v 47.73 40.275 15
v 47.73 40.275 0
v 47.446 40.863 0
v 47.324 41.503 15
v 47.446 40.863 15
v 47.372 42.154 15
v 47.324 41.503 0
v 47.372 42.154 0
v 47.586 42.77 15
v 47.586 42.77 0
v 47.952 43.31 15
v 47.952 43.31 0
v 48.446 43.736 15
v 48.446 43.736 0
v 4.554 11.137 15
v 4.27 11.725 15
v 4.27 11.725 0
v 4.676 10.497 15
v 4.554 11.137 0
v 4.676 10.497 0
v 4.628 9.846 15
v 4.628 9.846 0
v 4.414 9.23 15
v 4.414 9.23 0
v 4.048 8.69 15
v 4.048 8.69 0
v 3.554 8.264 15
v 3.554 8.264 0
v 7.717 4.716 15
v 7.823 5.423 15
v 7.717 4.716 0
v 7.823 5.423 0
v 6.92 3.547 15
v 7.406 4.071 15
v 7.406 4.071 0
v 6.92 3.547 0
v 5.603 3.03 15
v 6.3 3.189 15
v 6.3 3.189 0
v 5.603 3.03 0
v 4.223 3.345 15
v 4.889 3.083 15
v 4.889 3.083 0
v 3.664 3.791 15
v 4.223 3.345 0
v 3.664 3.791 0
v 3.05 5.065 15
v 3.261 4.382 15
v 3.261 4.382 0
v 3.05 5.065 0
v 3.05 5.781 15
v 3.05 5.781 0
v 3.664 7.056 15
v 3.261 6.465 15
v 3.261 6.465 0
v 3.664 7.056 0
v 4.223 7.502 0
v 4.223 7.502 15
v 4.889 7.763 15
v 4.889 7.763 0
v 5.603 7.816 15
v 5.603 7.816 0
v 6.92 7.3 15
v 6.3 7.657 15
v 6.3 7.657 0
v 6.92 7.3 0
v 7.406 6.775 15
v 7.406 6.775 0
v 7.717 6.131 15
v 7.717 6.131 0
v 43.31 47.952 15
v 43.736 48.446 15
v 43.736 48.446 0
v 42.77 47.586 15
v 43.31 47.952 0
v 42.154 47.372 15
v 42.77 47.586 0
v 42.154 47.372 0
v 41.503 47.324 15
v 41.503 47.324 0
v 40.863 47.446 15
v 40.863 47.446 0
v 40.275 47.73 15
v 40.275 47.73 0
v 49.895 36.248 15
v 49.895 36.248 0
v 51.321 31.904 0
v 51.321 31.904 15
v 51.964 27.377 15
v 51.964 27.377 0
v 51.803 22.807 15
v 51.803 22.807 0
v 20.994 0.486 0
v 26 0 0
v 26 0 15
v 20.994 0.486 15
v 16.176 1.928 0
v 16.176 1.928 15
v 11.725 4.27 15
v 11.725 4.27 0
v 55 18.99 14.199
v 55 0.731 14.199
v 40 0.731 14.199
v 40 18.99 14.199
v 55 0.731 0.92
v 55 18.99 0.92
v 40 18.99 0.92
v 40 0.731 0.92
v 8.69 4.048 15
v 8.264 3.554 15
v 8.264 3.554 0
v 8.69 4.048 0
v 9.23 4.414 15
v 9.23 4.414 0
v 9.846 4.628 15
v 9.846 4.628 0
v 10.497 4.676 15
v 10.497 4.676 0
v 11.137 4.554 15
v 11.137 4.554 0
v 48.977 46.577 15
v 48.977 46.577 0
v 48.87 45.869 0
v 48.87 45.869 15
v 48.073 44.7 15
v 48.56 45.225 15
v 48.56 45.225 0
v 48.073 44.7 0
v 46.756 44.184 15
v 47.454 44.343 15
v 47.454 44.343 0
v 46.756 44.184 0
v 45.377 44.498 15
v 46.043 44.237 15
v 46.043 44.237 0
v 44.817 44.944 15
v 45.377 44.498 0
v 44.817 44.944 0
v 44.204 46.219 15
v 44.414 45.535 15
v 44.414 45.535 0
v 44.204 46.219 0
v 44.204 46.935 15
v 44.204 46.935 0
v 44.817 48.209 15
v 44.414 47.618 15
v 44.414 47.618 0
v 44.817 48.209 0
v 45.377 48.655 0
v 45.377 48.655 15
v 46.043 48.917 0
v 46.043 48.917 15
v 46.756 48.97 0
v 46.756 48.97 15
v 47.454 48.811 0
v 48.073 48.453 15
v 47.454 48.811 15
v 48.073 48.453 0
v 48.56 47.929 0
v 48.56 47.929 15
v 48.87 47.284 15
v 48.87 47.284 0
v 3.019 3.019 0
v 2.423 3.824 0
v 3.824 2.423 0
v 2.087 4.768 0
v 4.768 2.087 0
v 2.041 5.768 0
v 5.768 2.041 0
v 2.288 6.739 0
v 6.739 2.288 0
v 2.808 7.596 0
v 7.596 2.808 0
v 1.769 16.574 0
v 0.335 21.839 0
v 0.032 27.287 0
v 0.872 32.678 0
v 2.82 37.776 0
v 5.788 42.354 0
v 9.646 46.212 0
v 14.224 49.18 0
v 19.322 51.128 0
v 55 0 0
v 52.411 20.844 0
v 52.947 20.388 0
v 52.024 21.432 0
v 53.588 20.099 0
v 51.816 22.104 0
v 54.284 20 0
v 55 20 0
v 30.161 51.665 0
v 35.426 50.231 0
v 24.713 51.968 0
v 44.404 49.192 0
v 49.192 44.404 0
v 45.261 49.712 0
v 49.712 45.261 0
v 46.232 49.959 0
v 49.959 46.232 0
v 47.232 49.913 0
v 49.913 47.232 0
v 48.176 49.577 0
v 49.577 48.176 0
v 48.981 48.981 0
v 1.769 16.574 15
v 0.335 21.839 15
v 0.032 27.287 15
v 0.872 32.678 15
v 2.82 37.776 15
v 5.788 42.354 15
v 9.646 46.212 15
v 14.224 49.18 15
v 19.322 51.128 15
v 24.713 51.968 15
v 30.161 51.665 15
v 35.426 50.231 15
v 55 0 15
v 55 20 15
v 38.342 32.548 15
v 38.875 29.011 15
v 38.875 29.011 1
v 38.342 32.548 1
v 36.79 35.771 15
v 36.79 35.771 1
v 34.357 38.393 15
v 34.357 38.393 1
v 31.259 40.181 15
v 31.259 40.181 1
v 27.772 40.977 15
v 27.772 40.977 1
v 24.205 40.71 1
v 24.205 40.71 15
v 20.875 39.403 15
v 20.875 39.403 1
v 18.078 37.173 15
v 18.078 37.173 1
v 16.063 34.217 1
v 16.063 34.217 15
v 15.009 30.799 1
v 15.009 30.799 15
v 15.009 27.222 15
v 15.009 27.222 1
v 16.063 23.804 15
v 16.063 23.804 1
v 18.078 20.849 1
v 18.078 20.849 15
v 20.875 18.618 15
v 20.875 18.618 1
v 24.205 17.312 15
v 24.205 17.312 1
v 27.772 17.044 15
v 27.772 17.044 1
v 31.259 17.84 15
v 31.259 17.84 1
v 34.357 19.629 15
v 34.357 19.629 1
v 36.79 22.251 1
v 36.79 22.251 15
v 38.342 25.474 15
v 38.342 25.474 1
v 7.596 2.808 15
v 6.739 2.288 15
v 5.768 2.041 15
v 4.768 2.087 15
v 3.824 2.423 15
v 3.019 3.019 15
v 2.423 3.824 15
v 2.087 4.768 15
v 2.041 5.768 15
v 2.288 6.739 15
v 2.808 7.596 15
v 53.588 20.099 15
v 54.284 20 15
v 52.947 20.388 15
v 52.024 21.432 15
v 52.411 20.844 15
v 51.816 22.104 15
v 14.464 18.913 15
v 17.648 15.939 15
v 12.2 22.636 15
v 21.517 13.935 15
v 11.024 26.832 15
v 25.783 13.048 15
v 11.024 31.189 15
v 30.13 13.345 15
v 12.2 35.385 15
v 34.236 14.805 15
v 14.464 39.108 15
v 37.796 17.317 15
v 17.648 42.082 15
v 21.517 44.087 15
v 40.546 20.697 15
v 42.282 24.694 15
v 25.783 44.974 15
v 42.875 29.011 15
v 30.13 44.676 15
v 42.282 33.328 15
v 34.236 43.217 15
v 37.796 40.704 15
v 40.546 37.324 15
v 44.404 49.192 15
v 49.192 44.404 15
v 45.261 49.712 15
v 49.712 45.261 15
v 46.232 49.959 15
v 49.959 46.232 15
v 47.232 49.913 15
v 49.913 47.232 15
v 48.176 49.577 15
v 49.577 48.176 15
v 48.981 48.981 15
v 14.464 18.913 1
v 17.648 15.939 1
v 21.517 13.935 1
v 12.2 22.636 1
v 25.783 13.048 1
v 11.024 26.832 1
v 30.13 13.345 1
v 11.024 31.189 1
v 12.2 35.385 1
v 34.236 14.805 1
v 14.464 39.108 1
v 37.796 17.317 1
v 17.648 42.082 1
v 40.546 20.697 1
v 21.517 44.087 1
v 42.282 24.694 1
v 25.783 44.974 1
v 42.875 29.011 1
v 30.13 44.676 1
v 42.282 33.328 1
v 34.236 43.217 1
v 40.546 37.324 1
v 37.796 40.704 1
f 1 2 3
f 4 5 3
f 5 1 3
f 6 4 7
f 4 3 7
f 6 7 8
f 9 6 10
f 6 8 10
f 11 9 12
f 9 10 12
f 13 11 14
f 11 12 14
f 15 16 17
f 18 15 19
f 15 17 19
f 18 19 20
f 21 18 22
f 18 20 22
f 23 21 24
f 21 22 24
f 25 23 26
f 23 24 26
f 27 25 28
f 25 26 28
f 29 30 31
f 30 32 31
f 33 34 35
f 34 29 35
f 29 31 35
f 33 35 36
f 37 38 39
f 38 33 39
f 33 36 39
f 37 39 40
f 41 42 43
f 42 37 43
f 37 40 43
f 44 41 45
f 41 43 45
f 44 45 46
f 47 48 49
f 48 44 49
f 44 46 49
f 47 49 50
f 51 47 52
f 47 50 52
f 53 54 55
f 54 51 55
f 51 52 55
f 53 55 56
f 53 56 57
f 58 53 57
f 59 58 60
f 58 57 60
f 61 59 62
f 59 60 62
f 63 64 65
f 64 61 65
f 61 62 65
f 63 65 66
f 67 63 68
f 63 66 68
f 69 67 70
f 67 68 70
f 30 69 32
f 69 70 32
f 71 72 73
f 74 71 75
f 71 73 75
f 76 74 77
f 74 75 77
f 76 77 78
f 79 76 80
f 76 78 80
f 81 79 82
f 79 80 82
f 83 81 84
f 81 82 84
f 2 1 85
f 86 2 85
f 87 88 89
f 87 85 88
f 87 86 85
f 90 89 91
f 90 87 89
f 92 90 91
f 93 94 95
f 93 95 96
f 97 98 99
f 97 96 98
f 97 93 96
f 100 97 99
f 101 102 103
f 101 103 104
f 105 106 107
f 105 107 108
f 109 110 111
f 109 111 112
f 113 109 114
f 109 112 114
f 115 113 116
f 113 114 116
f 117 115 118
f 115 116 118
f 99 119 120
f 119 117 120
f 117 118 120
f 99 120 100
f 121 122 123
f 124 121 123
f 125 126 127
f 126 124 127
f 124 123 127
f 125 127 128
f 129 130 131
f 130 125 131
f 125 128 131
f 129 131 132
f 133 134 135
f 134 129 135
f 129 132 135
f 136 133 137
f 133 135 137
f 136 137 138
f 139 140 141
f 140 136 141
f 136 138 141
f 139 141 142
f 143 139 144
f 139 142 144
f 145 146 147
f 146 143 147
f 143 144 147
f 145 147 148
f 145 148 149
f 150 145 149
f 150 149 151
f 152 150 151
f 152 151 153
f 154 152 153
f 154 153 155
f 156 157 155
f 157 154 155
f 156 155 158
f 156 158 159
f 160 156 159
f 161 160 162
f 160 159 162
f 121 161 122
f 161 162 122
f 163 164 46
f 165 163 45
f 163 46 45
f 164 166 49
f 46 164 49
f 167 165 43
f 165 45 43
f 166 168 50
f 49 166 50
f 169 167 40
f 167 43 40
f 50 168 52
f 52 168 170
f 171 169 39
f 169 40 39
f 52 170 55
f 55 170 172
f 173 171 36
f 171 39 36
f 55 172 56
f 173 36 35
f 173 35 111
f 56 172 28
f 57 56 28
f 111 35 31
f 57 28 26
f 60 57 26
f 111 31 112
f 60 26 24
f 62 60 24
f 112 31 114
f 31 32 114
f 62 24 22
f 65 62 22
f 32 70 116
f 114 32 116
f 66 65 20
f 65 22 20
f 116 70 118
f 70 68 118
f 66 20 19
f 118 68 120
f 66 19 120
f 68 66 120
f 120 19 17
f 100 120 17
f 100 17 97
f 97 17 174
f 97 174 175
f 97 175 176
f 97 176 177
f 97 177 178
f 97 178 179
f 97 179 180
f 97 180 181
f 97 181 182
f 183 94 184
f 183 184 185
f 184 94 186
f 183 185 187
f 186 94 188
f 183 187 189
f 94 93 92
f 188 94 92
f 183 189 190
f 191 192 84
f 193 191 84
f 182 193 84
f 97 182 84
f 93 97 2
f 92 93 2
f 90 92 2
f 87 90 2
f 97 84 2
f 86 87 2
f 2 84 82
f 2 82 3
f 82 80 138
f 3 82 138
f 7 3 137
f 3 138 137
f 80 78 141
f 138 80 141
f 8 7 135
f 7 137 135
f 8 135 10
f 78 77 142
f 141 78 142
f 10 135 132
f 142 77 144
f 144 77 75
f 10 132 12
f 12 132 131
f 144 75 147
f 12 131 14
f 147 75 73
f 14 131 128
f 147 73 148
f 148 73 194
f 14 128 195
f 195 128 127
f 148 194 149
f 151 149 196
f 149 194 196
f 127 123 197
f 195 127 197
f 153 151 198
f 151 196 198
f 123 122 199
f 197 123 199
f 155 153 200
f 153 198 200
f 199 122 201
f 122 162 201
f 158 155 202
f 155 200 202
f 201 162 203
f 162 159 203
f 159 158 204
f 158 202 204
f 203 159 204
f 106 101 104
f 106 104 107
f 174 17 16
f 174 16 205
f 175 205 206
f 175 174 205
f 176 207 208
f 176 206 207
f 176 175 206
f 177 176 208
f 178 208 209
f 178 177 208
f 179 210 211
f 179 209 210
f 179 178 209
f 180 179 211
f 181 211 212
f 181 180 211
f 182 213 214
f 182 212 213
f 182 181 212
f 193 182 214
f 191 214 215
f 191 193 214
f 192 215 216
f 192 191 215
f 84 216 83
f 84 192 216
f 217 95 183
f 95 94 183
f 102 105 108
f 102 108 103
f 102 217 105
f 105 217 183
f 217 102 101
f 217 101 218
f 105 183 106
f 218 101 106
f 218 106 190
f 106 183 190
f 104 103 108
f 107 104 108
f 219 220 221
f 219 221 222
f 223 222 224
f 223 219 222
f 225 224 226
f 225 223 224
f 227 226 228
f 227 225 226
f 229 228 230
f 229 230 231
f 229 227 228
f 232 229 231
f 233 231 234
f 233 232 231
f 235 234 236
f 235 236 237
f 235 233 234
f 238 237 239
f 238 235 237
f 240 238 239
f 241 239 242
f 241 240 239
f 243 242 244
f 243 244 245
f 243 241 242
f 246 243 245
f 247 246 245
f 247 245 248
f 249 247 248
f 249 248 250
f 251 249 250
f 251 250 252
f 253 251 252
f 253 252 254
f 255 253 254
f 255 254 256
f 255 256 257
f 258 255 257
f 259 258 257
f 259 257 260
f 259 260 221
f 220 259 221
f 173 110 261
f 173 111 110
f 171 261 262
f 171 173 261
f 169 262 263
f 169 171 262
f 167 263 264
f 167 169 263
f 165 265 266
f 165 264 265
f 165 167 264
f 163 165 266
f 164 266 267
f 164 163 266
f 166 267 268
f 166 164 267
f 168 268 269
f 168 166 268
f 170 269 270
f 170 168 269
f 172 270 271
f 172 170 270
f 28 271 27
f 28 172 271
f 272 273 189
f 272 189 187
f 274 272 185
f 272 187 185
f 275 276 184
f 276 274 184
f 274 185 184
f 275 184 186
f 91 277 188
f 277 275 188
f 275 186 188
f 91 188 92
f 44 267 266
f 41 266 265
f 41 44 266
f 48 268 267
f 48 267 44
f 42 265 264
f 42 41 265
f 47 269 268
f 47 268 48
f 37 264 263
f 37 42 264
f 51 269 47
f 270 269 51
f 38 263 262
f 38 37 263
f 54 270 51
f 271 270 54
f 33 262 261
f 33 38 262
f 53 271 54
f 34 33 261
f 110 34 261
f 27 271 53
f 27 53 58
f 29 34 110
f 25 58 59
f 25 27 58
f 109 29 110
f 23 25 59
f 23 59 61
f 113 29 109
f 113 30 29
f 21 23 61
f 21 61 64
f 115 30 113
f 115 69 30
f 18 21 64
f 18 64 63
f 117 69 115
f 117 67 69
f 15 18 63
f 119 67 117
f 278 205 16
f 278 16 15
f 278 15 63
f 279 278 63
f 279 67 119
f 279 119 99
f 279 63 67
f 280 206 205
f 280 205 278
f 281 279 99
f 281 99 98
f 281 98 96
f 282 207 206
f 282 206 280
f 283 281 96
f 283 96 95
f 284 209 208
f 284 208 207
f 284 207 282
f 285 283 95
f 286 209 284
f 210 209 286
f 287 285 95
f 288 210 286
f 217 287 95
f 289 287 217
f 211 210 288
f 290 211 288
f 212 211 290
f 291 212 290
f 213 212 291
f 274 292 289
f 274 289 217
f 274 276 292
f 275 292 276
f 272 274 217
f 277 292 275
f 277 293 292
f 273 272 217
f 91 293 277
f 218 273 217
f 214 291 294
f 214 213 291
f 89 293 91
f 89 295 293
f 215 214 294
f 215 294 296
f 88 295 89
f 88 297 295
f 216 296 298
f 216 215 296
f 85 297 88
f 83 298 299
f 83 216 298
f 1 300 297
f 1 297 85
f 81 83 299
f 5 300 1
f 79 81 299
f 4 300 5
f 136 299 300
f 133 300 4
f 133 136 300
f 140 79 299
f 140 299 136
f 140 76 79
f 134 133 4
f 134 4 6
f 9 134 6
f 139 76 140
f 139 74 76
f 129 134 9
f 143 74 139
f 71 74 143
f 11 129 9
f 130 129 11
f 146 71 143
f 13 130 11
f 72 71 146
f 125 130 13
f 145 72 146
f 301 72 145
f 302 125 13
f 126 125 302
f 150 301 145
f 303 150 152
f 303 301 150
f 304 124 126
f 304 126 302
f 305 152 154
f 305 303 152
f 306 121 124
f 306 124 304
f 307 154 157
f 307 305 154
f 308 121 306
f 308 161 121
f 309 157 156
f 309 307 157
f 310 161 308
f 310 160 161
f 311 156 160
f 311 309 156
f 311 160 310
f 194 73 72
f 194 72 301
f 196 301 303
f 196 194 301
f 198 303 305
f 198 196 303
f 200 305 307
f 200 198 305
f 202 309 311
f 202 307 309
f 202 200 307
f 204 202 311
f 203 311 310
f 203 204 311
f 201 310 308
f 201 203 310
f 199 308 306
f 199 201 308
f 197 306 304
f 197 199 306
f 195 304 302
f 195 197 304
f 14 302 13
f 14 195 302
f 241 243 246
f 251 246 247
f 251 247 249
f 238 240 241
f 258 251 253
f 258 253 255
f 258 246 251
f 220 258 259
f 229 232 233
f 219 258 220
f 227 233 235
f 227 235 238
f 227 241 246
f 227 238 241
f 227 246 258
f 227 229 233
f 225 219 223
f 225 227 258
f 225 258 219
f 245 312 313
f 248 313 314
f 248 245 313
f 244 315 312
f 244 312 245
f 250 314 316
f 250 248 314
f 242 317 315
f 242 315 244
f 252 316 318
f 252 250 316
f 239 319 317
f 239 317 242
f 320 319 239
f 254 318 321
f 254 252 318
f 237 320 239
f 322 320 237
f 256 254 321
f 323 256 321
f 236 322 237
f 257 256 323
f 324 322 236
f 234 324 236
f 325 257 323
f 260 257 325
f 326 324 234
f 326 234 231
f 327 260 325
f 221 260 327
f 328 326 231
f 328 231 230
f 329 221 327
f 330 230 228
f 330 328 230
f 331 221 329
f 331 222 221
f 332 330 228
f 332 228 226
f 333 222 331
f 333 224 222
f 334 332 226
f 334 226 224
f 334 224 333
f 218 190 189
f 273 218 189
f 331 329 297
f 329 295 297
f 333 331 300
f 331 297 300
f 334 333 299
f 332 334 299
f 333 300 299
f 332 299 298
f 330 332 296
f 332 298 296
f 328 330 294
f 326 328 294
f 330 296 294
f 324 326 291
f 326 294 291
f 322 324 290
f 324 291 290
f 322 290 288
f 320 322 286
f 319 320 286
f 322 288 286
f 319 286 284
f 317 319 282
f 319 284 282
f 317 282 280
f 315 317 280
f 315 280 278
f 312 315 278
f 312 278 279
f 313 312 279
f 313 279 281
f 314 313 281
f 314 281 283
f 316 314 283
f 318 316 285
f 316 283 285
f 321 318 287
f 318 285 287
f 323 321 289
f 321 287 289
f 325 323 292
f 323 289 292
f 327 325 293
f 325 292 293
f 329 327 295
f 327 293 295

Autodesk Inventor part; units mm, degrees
ref_plane "YZ Plane" through (0, 0, 0) normal (1, 0, 0) x (0, 1, 0)
ref_plane "XZ Plane" through (0, 0, 0) normal (0, 1, 0) x (-1, 0, 0)
ref_plane "XY Plane" through (0, 0, 0) normal (0, 0, 1) x (1, 0, 0)
sketch "Sketch1" plane through (0, 0, 0) normal (0, 0, 1) x (1, 0, 0)
  line L0 (26, 0) -> (52, 0)
  circle A0 centre (46.5768, 46.5768) radius 2.4
  arc A1 (48.4457, 43.7365) -> (43.7365, 48.4457) centre (46.5768, 46.5768) ccw
  arc A2 (3.5543, 8.2635) -> (8.2635, 3.5543) centre (5.4232, 5.4232) ccw
  circle A3 centre (5.4232, 5.4232) radius 2.4
  line L1 (55, 0) -> (55, 20)
  arc A4 (40.2754, 47.7304) -> (43.7365, 48.4457) centre (41.6481, 49.8199) ccw
  arc A5 (48.4457, 43.7365) -> (47.7304, 40.2754) centre (49.8199, 41.6481) ccw
  arc A6 (40.2754, 47.7304) -> (4.2696, 11.7246) centre (26, 26) ccw
  arc A7 (11.7246, 4.2696) -> (8.2635, 3.5543) centre (10.3519, 2.1801) ccw
  arc A8 (3.5543, 8.2635) -> (4.2696, 11.7246) centre (2.1801, 10.3519) ccw
  arc A9 (11.7246, 4.2696) -> (26, 0) centre (26, 26) ccw
  arc A10 (51.8032, 22.807) -> (47.7304, 40.2754) centre (26, 26) ccw
  arc A11 (51.8032, 22.807) -> (54.2843, 20) centre (54.2843, 22.5) ccw
  line L2 (55, 0) -> (52, 0)
  line L3 (55, 20) -> (54.2843, 20)
  point P0 (48.981, 48.981)
  dimension "d6" = 4.8
  dimension "d7" = 29
  dimension "d8" = 20
  dimension "d9" = 2.5
  dimension "d10" = 2.5
  dimension "d11" = 2.5
extrude "Extrusion1" add sketch "Sketch1" along normal blind 15
sketch "Sketch2" plane through (55, 0, 0) normal (1, 0, 0) x (0, 0, -1)
  line L0 (-14.1994, 18.9903) -> (-0.92, 18.9903)
  line L1 (-0.92, 18.9903) -> (-0.92, 0.7311)
  line L2 (-0.92, 0.7311) -> (-14.1994, 0.7311)
  line L3 (-14.1994, 0.7311) -> (-14.1994, 18.9903)
extrude "Extrusion2" cut sketch "Sketch2" against normal blind 15
sketch "Sketch3" plane through (0, 0, 15) normal (0, 0, 1) x (1, 0, 0)
  circle A0 centre (26.8751, 29.0108) radius 12
  circle A1 centre (26.8751, 29.0108) radius 16
  point P0 (0, 0)
  dimension "d16" = 24
  dimension "d18" = 32
extrude "Extrusion3" cut sketch "Sketch3" against normal blind 14
properties part number "blowerFan50x15"
